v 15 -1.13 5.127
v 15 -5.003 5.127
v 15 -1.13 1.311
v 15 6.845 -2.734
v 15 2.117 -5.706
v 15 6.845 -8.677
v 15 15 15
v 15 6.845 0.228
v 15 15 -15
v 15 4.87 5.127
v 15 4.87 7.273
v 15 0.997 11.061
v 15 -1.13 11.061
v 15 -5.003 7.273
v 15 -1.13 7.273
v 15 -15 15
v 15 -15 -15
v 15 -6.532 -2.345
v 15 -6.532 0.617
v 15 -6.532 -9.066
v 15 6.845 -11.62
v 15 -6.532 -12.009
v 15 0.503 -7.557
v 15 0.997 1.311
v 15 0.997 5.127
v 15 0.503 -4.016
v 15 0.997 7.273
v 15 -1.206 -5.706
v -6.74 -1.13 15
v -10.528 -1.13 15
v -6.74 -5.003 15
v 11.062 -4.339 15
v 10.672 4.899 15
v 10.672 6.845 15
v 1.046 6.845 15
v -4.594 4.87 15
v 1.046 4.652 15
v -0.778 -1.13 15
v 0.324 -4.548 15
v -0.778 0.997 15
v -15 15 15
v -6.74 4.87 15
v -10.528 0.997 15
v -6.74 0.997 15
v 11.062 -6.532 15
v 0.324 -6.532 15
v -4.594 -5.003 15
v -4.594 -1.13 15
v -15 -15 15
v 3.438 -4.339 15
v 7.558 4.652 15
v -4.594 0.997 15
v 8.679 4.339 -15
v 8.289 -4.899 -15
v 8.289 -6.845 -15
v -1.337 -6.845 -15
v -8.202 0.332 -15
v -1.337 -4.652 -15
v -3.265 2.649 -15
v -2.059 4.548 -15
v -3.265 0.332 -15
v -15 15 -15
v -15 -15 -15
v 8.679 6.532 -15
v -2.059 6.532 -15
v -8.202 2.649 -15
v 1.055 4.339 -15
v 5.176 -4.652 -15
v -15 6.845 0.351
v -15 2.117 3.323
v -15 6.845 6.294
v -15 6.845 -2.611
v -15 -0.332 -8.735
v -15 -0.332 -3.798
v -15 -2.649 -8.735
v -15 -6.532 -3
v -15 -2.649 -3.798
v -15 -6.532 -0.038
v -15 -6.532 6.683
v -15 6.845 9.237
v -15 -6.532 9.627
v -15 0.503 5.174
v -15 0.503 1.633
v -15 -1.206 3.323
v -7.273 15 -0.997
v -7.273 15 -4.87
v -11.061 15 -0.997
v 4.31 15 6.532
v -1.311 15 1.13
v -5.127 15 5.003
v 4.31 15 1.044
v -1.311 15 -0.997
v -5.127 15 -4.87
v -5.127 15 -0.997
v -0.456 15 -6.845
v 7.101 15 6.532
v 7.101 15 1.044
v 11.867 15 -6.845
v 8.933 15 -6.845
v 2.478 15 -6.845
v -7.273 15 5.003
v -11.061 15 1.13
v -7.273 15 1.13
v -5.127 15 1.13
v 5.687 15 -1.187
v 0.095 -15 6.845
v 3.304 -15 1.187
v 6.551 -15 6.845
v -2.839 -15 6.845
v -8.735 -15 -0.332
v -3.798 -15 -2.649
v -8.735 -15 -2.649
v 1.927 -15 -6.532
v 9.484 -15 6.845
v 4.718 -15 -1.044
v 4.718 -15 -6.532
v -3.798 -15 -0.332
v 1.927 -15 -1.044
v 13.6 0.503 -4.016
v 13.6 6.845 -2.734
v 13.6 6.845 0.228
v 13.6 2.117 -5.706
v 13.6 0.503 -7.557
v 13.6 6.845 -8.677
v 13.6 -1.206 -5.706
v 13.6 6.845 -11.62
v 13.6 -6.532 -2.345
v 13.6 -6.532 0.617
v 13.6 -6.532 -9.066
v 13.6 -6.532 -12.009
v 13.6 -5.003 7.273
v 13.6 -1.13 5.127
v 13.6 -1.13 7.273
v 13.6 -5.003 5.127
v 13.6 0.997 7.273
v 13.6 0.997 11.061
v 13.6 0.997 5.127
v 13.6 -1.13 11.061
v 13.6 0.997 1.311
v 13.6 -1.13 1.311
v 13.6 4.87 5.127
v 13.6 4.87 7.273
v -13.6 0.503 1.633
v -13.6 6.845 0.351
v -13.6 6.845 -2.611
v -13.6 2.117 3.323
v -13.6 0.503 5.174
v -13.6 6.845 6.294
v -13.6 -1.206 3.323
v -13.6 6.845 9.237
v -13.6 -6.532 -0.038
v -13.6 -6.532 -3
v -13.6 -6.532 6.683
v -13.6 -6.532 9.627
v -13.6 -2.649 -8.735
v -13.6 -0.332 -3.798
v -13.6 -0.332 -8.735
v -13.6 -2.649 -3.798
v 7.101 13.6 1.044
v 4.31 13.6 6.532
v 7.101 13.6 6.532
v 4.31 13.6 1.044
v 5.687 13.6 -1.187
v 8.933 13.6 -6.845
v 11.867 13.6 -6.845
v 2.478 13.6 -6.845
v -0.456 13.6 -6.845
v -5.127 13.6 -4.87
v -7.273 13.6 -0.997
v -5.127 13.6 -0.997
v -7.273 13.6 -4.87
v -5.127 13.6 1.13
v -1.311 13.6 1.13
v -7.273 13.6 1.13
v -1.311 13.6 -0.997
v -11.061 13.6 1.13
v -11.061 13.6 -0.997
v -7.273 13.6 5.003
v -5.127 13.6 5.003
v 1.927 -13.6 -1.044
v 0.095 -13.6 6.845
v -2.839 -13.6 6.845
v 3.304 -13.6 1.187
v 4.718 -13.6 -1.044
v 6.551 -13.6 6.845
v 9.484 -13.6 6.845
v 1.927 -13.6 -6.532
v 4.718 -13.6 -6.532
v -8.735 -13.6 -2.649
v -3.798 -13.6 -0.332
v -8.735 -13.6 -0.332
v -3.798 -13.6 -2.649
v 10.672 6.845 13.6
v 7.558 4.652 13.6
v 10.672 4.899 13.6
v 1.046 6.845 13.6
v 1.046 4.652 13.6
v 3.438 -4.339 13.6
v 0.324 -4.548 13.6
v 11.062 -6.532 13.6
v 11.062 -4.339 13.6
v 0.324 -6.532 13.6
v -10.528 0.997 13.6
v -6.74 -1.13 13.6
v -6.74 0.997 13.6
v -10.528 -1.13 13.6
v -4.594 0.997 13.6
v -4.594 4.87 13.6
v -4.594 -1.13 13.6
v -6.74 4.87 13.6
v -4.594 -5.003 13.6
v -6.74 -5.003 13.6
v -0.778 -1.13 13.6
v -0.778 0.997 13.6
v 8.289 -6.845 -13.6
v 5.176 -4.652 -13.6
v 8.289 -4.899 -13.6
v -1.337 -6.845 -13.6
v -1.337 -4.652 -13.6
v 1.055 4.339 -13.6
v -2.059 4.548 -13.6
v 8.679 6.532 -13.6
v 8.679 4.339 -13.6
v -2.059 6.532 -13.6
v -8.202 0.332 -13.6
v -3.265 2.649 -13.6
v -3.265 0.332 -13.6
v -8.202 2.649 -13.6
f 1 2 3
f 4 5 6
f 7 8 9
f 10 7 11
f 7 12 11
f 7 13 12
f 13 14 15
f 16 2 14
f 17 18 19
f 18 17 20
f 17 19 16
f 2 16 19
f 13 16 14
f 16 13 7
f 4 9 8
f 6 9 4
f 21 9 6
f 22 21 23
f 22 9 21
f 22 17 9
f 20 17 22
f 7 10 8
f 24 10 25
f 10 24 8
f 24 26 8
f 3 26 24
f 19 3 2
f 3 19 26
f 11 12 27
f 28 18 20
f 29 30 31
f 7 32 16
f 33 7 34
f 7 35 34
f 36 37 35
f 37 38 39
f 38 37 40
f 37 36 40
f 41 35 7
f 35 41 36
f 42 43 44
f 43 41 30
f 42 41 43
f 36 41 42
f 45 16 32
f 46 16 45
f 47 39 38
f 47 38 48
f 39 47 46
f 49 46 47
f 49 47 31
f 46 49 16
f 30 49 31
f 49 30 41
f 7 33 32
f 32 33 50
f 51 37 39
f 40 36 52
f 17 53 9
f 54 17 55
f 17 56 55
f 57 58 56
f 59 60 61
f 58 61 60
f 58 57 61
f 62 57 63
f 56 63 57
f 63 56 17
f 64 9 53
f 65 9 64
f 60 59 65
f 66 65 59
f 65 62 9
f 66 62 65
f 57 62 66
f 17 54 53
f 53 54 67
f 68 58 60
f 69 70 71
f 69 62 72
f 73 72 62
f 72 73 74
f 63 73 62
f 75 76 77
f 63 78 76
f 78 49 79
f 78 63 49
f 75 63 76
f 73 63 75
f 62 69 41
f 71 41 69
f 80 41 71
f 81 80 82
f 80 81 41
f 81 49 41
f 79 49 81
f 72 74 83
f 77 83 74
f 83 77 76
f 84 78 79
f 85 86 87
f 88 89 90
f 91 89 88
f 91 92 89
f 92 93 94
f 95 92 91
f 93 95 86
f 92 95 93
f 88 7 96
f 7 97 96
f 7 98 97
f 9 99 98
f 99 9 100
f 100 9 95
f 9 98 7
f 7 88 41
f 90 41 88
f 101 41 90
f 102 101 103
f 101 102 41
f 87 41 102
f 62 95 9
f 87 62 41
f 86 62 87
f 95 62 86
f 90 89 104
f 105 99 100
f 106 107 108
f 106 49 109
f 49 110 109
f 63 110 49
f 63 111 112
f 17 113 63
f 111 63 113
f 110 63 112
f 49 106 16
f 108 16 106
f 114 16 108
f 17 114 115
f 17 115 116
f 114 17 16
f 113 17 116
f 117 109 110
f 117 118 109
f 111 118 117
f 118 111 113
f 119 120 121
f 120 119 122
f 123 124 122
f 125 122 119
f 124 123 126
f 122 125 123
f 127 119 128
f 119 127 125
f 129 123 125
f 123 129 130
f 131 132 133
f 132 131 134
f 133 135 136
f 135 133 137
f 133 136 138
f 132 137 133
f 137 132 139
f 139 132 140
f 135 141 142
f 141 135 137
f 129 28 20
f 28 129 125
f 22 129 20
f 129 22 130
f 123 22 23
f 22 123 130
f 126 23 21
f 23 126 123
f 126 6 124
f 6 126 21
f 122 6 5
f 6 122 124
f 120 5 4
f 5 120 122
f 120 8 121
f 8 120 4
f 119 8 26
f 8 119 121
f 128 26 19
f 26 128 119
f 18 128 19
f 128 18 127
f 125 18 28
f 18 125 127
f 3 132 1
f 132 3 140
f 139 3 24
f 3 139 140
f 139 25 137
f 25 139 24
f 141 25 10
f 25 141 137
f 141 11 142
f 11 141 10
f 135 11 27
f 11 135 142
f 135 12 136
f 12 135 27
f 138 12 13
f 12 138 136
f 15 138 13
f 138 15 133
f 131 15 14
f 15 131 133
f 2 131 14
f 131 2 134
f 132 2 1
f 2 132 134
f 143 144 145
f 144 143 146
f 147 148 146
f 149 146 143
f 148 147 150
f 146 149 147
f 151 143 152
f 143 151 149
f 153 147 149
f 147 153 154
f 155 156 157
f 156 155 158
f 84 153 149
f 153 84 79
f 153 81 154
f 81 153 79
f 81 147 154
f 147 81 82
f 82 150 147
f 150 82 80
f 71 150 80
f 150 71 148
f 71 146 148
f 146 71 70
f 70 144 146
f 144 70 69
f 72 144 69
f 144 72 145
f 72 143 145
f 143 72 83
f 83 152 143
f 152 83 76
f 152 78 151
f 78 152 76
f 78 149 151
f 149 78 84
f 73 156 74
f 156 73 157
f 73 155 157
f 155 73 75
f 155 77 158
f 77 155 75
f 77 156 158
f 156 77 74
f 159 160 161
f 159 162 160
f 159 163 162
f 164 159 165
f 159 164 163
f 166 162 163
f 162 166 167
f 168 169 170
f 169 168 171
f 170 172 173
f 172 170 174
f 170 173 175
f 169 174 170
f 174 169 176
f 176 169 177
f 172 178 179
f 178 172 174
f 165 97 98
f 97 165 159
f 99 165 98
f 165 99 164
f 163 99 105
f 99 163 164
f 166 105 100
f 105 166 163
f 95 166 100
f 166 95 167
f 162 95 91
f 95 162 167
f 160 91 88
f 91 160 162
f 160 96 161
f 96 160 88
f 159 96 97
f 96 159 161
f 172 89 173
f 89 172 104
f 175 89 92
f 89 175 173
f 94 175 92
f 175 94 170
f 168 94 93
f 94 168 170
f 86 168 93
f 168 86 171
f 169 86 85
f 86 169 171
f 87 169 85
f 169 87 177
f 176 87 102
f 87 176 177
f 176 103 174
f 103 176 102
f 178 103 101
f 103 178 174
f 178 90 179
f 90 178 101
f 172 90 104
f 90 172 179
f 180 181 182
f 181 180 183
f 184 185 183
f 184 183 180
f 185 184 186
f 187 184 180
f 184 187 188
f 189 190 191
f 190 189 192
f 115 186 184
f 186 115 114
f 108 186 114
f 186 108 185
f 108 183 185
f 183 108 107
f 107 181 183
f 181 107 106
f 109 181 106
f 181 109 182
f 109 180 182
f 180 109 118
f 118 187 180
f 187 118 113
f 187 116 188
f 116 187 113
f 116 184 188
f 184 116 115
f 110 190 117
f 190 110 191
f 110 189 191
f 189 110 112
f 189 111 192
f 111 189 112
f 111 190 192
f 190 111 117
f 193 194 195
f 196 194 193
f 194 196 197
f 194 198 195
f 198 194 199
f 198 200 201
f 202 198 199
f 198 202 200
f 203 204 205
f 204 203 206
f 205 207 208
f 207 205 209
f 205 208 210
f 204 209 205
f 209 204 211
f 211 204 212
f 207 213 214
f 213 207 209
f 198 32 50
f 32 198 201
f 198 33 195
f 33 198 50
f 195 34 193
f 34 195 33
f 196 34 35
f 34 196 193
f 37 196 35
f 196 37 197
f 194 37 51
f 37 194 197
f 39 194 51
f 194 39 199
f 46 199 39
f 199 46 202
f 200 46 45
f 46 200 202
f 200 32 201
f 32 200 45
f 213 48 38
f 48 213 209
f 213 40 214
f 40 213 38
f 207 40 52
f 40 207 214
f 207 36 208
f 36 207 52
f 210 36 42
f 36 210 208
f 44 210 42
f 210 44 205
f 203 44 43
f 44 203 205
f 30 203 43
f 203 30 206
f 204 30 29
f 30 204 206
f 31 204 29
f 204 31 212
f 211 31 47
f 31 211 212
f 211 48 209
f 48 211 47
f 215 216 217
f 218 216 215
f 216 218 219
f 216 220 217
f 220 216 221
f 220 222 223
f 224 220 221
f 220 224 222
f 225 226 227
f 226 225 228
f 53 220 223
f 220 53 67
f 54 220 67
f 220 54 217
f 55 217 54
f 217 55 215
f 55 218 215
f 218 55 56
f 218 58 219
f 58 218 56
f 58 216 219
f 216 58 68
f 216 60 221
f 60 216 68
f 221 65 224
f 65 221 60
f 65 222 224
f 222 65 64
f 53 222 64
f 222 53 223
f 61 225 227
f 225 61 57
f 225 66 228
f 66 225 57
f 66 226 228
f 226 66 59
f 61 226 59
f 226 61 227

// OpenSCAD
// cube_xyz_all_faces_engraved.scad
// Engraved (cut-in) letters on every face:
// ±X => X, ±Y => Y, ±Z => Z
//
// NOTE: Use Render (F6) before exporting STL; boolean text cuts often won't show correctly in Preview (F5).

$fn = 64;

cube_size  = 30;   // mm
text_size  = 14;   // font size
engrave    = 1.5;  // mm cut depth
font_name  = "Liberation Sans:style=Bold";

module text_solid(ch) {
  // A 3D solid that extrudes in +Z (local coords)
  translate([0,0,.1]) {
    linear_extrude(height = engrave) {
      text(ch, size = text_size, font = font_name, halign="center", valign="center");
    }
  }
}

module cut_on_face(face) {
  // Places the extruded text fully INSIDE the cube, flush to the chosen face.
  // Because the solid is inside the cube, difference() reliably engraves it.

  if (face == "+Z") {
    translate([0,0, cube_size/2 - engrave])
      text_solid(face);
  } else if (face == "-Z") {
    translate([0,0, -cube_size/2 + engrave])
      rotate([180,0,0]) text_solid(face);
  } else if (face == "+Y") {
    translate([0, cube_size/2 - engrave, 0])
      rotate([-90,0,0]) text_solid(face);   // +Z -> +Y
  } else if (face == "-Y") {
    translate([0, -cube_size/2 + engrave, 0])
      rotate([90,0,0]) text_solid(face);    // +Z -> -Y
  } else if (face == "+X") {
    translate([cube_size/2 - engrave, 0, 0])
      rotate([0,90,0]) text_solid(face);    // +Z -> +X
  } else if (face == "-X") {
    translate([-cube_size/2 + engrave, 0, 0])
      rotate([0,-90,0]) text_solid(face);   // +Z -> -X
  }
}

difference() {
  cube([cube_size, cube_size, cube_size], center=true);

  cut_on_face("+X");
  cut_on_face("-X");

  cut_on_face("+Y");
  cut_on_face("-Y");

  cut_on_face("+Z");
  cut_on_face("-Z");
}
